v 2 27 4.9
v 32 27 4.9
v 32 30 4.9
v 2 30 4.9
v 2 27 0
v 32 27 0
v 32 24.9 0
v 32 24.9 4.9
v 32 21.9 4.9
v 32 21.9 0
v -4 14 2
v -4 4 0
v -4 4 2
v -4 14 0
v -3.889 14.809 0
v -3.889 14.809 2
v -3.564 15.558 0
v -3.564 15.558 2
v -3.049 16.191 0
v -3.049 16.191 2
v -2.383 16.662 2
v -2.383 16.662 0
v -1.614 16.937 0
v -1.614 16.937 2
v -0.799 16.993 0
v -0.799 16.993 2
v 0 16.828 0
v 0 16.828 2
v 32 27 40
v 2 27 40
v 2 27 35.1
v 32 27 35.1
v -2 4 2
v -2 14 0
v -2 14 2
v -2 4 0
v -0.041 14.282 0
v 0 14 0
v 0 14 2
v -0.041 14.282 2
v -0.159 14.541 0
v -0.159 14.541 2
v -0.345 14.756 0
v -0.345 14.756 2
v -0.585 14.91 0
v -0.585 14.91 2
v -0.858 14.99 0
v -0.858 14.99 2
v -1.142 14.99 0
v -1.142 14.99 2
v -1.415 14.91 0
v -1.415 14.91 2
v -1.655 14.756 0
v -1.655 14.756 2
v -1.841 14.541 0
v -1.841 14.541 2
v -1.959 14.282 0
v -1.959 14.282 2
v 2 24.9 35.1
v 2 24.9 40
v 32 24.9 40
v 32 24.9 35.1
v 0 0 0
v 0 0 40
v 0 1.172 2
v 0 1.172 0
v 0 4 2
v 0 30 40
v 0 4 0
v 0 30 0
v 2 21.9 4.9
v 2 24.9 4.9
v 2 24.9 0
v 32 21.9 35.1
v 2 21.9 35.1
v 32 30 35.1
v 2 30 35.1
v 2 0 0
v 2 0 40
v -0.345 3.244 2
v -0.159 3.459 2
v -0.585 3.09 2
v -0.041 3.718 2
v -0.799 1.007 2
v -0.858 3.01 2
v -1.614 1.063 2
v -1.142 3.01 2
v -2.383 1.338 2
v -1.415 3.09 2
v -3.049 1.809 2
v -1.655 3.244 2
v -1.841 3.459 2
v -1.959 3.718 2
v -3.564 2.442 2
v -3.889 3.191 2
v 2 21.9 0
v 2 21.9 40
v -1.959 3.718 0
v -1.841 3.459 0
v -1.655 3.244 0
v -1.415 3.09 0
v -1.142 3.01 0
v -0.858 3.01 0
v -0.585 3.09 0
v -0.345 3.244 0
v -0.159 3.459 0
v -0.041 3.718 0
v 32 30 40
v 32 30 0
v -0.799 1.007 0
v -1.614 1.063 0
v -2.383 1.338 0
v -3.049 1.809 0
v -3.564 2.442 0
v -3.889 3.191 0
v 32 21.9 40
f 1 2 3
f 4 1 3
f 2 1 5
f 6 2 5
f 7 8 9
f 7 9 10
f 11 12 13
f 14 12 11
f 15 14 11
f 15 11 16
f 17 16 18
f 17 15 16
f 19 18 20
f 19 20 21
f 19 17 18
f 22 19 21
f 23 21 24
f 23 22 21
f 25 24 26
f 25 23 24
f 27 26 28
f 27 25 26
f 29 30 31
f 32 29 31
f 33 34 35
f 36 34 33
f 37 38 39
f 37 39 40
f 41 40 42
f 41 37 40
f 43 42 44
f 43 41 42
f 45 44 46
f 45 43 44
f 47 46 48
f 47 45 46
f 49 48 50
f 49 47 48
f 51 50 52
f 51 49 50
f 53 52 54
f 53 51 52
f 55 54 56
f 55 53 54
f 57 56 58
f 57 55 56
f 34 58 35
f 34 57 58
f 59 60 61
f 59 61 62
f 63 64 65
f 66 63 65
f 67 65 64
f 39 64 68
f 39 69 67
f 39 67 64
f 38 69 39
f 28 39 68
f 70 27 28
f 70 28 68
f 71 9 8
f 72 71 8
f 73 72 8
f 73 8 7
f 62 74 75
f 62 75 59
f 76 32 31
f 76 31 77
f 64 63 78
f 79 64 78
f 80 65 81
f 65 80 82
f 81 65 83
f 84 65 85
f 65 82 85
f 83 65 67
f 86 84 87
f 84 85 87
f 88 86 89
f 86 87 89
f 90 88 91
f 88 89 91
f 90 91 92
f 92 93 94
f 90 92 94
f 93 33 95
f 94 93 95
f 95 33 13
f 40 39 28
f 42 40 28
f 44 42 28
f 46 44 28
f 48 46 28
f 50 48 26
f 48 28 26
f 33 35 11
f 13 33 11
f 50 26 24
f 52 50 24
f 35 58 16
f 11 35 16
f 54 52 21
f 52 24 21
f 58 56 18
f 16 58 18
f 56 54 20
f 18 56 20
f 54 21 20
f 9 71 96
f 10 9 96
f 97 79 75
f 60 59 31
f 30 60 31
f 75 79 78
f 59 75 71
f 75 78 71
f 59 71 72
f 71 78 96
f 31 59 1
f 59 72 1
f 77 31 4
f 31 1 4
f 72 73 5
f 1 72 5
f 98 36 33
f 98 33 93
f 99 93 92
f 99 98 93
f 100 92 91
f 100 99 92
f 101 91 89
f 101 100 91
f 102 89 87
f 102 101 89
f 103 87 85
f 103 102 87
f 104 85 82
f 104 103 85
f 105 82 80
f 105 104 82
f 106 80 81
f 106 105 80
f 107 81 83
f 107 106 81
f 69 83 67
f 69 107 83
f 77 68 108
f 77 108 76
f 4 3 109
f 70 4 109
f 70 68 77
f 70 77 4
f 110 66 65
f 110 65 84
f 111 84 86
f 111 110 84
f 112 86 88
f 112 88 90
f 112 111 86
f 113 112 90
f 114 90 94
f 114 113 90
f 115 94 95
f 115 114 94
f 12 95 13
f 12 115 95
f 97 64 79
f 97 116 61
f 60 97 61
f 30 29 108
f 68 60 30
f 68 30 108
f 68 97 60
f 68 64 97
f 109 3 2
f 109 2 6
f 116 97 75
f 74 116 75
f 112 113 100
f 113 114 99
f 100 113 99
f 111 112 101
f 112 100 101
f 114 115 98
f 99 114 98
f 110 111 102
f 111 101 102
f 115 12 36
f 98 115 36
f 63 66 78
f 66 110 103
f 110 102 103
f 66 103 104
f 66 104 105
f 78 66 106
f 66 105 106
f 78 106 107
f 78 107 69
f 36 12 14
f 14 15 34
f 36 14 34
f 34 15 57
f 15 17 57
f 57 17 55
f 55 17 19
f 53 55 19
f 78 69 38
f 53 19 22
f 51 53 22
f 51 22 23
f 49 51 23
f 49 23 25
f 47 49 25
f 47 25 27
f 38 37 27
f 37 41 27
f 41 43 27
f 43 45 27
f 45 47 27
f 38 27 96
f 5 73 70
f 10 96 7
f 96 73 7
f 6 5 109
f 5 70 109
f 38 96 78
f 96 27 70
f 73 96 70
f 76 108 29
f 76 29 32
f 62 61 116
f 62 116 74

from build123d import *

# Parameters (mm, degrees)
SKICA1_W                = 2
SKICA1_H                = 30
P_IDAT_VYSUNUT_M1_DEPTH = 40
SKICA2_W                = 4.9
SKICA2_H                = 3
P_IDAT_VYSUNUT_M2_DEPTH = 30
P_IDAT_VYSUNUT_M3_DEPTH = 2


with BuildPart() as part:
    # Skica1 → Přidat vysunutím1 (new body)
    with BuildSketch(Plane.XY):
        with Locations((1, 15)):
            Rectangle(SKICA1_W, SKICA1_H)
    extrude(amount=P_IDAT_VYSUNUT_M1_DEPTH)

    # Skica2 → Přidat vysunutím2 (add)
    with BuildSketch(Plane(origin=(2, 0, 0), x_dir=(0, 0, -1), z_dir=(1, 0, 0))):
        with Locations((-37.55, 28.5)):
            Rectangle(SKICA2_W, SKICA2_H)
        with Locations((-2.45, 28.5)):
            Rectangle(SKICA2_W, SKICA2_H)
        with Locations((-37.55, 23.4)):
            Rectangle(SKICA2_W, SKICA2_H)
        with Locations((-2.45, 23.4)):
            Rectangle(SKICA2_W, SKICA2_H)
    extrude(amount=P_IDAT_VYSUNUT_M2_DEPTH)

    # Skica3 → Přidat vysunutím3 (add)
    with BuildSketch(Plane(origin=(0, 0, 0), x_dir=(-1, 0, 0), z_dir=(0, 0, -1))):
        with BuildLine():
            ThreePointArc((0, 14), (1, 15), (2, 14))
            Line((2, 14), (2, 4))
            ThreePointArc((2, 4), (1, 3), (0, 4))
            Line((0, 4), (0, 1.171572875))
            ThreePointArc((0, 1.171572875), (2.732050808, 1.550510257), (4, 4))
            Line((4, 4), (4, 14))
            ThreePointArc((4, 14), (2.732050808, 16.449489743), (0, 16.828427125))
            Line((0, 16.828427125), (0, 14))
        make_face()
    extrude(amount=-P_IDAT_VYSUNUT_M3_DEPTH)


solid = part.part
